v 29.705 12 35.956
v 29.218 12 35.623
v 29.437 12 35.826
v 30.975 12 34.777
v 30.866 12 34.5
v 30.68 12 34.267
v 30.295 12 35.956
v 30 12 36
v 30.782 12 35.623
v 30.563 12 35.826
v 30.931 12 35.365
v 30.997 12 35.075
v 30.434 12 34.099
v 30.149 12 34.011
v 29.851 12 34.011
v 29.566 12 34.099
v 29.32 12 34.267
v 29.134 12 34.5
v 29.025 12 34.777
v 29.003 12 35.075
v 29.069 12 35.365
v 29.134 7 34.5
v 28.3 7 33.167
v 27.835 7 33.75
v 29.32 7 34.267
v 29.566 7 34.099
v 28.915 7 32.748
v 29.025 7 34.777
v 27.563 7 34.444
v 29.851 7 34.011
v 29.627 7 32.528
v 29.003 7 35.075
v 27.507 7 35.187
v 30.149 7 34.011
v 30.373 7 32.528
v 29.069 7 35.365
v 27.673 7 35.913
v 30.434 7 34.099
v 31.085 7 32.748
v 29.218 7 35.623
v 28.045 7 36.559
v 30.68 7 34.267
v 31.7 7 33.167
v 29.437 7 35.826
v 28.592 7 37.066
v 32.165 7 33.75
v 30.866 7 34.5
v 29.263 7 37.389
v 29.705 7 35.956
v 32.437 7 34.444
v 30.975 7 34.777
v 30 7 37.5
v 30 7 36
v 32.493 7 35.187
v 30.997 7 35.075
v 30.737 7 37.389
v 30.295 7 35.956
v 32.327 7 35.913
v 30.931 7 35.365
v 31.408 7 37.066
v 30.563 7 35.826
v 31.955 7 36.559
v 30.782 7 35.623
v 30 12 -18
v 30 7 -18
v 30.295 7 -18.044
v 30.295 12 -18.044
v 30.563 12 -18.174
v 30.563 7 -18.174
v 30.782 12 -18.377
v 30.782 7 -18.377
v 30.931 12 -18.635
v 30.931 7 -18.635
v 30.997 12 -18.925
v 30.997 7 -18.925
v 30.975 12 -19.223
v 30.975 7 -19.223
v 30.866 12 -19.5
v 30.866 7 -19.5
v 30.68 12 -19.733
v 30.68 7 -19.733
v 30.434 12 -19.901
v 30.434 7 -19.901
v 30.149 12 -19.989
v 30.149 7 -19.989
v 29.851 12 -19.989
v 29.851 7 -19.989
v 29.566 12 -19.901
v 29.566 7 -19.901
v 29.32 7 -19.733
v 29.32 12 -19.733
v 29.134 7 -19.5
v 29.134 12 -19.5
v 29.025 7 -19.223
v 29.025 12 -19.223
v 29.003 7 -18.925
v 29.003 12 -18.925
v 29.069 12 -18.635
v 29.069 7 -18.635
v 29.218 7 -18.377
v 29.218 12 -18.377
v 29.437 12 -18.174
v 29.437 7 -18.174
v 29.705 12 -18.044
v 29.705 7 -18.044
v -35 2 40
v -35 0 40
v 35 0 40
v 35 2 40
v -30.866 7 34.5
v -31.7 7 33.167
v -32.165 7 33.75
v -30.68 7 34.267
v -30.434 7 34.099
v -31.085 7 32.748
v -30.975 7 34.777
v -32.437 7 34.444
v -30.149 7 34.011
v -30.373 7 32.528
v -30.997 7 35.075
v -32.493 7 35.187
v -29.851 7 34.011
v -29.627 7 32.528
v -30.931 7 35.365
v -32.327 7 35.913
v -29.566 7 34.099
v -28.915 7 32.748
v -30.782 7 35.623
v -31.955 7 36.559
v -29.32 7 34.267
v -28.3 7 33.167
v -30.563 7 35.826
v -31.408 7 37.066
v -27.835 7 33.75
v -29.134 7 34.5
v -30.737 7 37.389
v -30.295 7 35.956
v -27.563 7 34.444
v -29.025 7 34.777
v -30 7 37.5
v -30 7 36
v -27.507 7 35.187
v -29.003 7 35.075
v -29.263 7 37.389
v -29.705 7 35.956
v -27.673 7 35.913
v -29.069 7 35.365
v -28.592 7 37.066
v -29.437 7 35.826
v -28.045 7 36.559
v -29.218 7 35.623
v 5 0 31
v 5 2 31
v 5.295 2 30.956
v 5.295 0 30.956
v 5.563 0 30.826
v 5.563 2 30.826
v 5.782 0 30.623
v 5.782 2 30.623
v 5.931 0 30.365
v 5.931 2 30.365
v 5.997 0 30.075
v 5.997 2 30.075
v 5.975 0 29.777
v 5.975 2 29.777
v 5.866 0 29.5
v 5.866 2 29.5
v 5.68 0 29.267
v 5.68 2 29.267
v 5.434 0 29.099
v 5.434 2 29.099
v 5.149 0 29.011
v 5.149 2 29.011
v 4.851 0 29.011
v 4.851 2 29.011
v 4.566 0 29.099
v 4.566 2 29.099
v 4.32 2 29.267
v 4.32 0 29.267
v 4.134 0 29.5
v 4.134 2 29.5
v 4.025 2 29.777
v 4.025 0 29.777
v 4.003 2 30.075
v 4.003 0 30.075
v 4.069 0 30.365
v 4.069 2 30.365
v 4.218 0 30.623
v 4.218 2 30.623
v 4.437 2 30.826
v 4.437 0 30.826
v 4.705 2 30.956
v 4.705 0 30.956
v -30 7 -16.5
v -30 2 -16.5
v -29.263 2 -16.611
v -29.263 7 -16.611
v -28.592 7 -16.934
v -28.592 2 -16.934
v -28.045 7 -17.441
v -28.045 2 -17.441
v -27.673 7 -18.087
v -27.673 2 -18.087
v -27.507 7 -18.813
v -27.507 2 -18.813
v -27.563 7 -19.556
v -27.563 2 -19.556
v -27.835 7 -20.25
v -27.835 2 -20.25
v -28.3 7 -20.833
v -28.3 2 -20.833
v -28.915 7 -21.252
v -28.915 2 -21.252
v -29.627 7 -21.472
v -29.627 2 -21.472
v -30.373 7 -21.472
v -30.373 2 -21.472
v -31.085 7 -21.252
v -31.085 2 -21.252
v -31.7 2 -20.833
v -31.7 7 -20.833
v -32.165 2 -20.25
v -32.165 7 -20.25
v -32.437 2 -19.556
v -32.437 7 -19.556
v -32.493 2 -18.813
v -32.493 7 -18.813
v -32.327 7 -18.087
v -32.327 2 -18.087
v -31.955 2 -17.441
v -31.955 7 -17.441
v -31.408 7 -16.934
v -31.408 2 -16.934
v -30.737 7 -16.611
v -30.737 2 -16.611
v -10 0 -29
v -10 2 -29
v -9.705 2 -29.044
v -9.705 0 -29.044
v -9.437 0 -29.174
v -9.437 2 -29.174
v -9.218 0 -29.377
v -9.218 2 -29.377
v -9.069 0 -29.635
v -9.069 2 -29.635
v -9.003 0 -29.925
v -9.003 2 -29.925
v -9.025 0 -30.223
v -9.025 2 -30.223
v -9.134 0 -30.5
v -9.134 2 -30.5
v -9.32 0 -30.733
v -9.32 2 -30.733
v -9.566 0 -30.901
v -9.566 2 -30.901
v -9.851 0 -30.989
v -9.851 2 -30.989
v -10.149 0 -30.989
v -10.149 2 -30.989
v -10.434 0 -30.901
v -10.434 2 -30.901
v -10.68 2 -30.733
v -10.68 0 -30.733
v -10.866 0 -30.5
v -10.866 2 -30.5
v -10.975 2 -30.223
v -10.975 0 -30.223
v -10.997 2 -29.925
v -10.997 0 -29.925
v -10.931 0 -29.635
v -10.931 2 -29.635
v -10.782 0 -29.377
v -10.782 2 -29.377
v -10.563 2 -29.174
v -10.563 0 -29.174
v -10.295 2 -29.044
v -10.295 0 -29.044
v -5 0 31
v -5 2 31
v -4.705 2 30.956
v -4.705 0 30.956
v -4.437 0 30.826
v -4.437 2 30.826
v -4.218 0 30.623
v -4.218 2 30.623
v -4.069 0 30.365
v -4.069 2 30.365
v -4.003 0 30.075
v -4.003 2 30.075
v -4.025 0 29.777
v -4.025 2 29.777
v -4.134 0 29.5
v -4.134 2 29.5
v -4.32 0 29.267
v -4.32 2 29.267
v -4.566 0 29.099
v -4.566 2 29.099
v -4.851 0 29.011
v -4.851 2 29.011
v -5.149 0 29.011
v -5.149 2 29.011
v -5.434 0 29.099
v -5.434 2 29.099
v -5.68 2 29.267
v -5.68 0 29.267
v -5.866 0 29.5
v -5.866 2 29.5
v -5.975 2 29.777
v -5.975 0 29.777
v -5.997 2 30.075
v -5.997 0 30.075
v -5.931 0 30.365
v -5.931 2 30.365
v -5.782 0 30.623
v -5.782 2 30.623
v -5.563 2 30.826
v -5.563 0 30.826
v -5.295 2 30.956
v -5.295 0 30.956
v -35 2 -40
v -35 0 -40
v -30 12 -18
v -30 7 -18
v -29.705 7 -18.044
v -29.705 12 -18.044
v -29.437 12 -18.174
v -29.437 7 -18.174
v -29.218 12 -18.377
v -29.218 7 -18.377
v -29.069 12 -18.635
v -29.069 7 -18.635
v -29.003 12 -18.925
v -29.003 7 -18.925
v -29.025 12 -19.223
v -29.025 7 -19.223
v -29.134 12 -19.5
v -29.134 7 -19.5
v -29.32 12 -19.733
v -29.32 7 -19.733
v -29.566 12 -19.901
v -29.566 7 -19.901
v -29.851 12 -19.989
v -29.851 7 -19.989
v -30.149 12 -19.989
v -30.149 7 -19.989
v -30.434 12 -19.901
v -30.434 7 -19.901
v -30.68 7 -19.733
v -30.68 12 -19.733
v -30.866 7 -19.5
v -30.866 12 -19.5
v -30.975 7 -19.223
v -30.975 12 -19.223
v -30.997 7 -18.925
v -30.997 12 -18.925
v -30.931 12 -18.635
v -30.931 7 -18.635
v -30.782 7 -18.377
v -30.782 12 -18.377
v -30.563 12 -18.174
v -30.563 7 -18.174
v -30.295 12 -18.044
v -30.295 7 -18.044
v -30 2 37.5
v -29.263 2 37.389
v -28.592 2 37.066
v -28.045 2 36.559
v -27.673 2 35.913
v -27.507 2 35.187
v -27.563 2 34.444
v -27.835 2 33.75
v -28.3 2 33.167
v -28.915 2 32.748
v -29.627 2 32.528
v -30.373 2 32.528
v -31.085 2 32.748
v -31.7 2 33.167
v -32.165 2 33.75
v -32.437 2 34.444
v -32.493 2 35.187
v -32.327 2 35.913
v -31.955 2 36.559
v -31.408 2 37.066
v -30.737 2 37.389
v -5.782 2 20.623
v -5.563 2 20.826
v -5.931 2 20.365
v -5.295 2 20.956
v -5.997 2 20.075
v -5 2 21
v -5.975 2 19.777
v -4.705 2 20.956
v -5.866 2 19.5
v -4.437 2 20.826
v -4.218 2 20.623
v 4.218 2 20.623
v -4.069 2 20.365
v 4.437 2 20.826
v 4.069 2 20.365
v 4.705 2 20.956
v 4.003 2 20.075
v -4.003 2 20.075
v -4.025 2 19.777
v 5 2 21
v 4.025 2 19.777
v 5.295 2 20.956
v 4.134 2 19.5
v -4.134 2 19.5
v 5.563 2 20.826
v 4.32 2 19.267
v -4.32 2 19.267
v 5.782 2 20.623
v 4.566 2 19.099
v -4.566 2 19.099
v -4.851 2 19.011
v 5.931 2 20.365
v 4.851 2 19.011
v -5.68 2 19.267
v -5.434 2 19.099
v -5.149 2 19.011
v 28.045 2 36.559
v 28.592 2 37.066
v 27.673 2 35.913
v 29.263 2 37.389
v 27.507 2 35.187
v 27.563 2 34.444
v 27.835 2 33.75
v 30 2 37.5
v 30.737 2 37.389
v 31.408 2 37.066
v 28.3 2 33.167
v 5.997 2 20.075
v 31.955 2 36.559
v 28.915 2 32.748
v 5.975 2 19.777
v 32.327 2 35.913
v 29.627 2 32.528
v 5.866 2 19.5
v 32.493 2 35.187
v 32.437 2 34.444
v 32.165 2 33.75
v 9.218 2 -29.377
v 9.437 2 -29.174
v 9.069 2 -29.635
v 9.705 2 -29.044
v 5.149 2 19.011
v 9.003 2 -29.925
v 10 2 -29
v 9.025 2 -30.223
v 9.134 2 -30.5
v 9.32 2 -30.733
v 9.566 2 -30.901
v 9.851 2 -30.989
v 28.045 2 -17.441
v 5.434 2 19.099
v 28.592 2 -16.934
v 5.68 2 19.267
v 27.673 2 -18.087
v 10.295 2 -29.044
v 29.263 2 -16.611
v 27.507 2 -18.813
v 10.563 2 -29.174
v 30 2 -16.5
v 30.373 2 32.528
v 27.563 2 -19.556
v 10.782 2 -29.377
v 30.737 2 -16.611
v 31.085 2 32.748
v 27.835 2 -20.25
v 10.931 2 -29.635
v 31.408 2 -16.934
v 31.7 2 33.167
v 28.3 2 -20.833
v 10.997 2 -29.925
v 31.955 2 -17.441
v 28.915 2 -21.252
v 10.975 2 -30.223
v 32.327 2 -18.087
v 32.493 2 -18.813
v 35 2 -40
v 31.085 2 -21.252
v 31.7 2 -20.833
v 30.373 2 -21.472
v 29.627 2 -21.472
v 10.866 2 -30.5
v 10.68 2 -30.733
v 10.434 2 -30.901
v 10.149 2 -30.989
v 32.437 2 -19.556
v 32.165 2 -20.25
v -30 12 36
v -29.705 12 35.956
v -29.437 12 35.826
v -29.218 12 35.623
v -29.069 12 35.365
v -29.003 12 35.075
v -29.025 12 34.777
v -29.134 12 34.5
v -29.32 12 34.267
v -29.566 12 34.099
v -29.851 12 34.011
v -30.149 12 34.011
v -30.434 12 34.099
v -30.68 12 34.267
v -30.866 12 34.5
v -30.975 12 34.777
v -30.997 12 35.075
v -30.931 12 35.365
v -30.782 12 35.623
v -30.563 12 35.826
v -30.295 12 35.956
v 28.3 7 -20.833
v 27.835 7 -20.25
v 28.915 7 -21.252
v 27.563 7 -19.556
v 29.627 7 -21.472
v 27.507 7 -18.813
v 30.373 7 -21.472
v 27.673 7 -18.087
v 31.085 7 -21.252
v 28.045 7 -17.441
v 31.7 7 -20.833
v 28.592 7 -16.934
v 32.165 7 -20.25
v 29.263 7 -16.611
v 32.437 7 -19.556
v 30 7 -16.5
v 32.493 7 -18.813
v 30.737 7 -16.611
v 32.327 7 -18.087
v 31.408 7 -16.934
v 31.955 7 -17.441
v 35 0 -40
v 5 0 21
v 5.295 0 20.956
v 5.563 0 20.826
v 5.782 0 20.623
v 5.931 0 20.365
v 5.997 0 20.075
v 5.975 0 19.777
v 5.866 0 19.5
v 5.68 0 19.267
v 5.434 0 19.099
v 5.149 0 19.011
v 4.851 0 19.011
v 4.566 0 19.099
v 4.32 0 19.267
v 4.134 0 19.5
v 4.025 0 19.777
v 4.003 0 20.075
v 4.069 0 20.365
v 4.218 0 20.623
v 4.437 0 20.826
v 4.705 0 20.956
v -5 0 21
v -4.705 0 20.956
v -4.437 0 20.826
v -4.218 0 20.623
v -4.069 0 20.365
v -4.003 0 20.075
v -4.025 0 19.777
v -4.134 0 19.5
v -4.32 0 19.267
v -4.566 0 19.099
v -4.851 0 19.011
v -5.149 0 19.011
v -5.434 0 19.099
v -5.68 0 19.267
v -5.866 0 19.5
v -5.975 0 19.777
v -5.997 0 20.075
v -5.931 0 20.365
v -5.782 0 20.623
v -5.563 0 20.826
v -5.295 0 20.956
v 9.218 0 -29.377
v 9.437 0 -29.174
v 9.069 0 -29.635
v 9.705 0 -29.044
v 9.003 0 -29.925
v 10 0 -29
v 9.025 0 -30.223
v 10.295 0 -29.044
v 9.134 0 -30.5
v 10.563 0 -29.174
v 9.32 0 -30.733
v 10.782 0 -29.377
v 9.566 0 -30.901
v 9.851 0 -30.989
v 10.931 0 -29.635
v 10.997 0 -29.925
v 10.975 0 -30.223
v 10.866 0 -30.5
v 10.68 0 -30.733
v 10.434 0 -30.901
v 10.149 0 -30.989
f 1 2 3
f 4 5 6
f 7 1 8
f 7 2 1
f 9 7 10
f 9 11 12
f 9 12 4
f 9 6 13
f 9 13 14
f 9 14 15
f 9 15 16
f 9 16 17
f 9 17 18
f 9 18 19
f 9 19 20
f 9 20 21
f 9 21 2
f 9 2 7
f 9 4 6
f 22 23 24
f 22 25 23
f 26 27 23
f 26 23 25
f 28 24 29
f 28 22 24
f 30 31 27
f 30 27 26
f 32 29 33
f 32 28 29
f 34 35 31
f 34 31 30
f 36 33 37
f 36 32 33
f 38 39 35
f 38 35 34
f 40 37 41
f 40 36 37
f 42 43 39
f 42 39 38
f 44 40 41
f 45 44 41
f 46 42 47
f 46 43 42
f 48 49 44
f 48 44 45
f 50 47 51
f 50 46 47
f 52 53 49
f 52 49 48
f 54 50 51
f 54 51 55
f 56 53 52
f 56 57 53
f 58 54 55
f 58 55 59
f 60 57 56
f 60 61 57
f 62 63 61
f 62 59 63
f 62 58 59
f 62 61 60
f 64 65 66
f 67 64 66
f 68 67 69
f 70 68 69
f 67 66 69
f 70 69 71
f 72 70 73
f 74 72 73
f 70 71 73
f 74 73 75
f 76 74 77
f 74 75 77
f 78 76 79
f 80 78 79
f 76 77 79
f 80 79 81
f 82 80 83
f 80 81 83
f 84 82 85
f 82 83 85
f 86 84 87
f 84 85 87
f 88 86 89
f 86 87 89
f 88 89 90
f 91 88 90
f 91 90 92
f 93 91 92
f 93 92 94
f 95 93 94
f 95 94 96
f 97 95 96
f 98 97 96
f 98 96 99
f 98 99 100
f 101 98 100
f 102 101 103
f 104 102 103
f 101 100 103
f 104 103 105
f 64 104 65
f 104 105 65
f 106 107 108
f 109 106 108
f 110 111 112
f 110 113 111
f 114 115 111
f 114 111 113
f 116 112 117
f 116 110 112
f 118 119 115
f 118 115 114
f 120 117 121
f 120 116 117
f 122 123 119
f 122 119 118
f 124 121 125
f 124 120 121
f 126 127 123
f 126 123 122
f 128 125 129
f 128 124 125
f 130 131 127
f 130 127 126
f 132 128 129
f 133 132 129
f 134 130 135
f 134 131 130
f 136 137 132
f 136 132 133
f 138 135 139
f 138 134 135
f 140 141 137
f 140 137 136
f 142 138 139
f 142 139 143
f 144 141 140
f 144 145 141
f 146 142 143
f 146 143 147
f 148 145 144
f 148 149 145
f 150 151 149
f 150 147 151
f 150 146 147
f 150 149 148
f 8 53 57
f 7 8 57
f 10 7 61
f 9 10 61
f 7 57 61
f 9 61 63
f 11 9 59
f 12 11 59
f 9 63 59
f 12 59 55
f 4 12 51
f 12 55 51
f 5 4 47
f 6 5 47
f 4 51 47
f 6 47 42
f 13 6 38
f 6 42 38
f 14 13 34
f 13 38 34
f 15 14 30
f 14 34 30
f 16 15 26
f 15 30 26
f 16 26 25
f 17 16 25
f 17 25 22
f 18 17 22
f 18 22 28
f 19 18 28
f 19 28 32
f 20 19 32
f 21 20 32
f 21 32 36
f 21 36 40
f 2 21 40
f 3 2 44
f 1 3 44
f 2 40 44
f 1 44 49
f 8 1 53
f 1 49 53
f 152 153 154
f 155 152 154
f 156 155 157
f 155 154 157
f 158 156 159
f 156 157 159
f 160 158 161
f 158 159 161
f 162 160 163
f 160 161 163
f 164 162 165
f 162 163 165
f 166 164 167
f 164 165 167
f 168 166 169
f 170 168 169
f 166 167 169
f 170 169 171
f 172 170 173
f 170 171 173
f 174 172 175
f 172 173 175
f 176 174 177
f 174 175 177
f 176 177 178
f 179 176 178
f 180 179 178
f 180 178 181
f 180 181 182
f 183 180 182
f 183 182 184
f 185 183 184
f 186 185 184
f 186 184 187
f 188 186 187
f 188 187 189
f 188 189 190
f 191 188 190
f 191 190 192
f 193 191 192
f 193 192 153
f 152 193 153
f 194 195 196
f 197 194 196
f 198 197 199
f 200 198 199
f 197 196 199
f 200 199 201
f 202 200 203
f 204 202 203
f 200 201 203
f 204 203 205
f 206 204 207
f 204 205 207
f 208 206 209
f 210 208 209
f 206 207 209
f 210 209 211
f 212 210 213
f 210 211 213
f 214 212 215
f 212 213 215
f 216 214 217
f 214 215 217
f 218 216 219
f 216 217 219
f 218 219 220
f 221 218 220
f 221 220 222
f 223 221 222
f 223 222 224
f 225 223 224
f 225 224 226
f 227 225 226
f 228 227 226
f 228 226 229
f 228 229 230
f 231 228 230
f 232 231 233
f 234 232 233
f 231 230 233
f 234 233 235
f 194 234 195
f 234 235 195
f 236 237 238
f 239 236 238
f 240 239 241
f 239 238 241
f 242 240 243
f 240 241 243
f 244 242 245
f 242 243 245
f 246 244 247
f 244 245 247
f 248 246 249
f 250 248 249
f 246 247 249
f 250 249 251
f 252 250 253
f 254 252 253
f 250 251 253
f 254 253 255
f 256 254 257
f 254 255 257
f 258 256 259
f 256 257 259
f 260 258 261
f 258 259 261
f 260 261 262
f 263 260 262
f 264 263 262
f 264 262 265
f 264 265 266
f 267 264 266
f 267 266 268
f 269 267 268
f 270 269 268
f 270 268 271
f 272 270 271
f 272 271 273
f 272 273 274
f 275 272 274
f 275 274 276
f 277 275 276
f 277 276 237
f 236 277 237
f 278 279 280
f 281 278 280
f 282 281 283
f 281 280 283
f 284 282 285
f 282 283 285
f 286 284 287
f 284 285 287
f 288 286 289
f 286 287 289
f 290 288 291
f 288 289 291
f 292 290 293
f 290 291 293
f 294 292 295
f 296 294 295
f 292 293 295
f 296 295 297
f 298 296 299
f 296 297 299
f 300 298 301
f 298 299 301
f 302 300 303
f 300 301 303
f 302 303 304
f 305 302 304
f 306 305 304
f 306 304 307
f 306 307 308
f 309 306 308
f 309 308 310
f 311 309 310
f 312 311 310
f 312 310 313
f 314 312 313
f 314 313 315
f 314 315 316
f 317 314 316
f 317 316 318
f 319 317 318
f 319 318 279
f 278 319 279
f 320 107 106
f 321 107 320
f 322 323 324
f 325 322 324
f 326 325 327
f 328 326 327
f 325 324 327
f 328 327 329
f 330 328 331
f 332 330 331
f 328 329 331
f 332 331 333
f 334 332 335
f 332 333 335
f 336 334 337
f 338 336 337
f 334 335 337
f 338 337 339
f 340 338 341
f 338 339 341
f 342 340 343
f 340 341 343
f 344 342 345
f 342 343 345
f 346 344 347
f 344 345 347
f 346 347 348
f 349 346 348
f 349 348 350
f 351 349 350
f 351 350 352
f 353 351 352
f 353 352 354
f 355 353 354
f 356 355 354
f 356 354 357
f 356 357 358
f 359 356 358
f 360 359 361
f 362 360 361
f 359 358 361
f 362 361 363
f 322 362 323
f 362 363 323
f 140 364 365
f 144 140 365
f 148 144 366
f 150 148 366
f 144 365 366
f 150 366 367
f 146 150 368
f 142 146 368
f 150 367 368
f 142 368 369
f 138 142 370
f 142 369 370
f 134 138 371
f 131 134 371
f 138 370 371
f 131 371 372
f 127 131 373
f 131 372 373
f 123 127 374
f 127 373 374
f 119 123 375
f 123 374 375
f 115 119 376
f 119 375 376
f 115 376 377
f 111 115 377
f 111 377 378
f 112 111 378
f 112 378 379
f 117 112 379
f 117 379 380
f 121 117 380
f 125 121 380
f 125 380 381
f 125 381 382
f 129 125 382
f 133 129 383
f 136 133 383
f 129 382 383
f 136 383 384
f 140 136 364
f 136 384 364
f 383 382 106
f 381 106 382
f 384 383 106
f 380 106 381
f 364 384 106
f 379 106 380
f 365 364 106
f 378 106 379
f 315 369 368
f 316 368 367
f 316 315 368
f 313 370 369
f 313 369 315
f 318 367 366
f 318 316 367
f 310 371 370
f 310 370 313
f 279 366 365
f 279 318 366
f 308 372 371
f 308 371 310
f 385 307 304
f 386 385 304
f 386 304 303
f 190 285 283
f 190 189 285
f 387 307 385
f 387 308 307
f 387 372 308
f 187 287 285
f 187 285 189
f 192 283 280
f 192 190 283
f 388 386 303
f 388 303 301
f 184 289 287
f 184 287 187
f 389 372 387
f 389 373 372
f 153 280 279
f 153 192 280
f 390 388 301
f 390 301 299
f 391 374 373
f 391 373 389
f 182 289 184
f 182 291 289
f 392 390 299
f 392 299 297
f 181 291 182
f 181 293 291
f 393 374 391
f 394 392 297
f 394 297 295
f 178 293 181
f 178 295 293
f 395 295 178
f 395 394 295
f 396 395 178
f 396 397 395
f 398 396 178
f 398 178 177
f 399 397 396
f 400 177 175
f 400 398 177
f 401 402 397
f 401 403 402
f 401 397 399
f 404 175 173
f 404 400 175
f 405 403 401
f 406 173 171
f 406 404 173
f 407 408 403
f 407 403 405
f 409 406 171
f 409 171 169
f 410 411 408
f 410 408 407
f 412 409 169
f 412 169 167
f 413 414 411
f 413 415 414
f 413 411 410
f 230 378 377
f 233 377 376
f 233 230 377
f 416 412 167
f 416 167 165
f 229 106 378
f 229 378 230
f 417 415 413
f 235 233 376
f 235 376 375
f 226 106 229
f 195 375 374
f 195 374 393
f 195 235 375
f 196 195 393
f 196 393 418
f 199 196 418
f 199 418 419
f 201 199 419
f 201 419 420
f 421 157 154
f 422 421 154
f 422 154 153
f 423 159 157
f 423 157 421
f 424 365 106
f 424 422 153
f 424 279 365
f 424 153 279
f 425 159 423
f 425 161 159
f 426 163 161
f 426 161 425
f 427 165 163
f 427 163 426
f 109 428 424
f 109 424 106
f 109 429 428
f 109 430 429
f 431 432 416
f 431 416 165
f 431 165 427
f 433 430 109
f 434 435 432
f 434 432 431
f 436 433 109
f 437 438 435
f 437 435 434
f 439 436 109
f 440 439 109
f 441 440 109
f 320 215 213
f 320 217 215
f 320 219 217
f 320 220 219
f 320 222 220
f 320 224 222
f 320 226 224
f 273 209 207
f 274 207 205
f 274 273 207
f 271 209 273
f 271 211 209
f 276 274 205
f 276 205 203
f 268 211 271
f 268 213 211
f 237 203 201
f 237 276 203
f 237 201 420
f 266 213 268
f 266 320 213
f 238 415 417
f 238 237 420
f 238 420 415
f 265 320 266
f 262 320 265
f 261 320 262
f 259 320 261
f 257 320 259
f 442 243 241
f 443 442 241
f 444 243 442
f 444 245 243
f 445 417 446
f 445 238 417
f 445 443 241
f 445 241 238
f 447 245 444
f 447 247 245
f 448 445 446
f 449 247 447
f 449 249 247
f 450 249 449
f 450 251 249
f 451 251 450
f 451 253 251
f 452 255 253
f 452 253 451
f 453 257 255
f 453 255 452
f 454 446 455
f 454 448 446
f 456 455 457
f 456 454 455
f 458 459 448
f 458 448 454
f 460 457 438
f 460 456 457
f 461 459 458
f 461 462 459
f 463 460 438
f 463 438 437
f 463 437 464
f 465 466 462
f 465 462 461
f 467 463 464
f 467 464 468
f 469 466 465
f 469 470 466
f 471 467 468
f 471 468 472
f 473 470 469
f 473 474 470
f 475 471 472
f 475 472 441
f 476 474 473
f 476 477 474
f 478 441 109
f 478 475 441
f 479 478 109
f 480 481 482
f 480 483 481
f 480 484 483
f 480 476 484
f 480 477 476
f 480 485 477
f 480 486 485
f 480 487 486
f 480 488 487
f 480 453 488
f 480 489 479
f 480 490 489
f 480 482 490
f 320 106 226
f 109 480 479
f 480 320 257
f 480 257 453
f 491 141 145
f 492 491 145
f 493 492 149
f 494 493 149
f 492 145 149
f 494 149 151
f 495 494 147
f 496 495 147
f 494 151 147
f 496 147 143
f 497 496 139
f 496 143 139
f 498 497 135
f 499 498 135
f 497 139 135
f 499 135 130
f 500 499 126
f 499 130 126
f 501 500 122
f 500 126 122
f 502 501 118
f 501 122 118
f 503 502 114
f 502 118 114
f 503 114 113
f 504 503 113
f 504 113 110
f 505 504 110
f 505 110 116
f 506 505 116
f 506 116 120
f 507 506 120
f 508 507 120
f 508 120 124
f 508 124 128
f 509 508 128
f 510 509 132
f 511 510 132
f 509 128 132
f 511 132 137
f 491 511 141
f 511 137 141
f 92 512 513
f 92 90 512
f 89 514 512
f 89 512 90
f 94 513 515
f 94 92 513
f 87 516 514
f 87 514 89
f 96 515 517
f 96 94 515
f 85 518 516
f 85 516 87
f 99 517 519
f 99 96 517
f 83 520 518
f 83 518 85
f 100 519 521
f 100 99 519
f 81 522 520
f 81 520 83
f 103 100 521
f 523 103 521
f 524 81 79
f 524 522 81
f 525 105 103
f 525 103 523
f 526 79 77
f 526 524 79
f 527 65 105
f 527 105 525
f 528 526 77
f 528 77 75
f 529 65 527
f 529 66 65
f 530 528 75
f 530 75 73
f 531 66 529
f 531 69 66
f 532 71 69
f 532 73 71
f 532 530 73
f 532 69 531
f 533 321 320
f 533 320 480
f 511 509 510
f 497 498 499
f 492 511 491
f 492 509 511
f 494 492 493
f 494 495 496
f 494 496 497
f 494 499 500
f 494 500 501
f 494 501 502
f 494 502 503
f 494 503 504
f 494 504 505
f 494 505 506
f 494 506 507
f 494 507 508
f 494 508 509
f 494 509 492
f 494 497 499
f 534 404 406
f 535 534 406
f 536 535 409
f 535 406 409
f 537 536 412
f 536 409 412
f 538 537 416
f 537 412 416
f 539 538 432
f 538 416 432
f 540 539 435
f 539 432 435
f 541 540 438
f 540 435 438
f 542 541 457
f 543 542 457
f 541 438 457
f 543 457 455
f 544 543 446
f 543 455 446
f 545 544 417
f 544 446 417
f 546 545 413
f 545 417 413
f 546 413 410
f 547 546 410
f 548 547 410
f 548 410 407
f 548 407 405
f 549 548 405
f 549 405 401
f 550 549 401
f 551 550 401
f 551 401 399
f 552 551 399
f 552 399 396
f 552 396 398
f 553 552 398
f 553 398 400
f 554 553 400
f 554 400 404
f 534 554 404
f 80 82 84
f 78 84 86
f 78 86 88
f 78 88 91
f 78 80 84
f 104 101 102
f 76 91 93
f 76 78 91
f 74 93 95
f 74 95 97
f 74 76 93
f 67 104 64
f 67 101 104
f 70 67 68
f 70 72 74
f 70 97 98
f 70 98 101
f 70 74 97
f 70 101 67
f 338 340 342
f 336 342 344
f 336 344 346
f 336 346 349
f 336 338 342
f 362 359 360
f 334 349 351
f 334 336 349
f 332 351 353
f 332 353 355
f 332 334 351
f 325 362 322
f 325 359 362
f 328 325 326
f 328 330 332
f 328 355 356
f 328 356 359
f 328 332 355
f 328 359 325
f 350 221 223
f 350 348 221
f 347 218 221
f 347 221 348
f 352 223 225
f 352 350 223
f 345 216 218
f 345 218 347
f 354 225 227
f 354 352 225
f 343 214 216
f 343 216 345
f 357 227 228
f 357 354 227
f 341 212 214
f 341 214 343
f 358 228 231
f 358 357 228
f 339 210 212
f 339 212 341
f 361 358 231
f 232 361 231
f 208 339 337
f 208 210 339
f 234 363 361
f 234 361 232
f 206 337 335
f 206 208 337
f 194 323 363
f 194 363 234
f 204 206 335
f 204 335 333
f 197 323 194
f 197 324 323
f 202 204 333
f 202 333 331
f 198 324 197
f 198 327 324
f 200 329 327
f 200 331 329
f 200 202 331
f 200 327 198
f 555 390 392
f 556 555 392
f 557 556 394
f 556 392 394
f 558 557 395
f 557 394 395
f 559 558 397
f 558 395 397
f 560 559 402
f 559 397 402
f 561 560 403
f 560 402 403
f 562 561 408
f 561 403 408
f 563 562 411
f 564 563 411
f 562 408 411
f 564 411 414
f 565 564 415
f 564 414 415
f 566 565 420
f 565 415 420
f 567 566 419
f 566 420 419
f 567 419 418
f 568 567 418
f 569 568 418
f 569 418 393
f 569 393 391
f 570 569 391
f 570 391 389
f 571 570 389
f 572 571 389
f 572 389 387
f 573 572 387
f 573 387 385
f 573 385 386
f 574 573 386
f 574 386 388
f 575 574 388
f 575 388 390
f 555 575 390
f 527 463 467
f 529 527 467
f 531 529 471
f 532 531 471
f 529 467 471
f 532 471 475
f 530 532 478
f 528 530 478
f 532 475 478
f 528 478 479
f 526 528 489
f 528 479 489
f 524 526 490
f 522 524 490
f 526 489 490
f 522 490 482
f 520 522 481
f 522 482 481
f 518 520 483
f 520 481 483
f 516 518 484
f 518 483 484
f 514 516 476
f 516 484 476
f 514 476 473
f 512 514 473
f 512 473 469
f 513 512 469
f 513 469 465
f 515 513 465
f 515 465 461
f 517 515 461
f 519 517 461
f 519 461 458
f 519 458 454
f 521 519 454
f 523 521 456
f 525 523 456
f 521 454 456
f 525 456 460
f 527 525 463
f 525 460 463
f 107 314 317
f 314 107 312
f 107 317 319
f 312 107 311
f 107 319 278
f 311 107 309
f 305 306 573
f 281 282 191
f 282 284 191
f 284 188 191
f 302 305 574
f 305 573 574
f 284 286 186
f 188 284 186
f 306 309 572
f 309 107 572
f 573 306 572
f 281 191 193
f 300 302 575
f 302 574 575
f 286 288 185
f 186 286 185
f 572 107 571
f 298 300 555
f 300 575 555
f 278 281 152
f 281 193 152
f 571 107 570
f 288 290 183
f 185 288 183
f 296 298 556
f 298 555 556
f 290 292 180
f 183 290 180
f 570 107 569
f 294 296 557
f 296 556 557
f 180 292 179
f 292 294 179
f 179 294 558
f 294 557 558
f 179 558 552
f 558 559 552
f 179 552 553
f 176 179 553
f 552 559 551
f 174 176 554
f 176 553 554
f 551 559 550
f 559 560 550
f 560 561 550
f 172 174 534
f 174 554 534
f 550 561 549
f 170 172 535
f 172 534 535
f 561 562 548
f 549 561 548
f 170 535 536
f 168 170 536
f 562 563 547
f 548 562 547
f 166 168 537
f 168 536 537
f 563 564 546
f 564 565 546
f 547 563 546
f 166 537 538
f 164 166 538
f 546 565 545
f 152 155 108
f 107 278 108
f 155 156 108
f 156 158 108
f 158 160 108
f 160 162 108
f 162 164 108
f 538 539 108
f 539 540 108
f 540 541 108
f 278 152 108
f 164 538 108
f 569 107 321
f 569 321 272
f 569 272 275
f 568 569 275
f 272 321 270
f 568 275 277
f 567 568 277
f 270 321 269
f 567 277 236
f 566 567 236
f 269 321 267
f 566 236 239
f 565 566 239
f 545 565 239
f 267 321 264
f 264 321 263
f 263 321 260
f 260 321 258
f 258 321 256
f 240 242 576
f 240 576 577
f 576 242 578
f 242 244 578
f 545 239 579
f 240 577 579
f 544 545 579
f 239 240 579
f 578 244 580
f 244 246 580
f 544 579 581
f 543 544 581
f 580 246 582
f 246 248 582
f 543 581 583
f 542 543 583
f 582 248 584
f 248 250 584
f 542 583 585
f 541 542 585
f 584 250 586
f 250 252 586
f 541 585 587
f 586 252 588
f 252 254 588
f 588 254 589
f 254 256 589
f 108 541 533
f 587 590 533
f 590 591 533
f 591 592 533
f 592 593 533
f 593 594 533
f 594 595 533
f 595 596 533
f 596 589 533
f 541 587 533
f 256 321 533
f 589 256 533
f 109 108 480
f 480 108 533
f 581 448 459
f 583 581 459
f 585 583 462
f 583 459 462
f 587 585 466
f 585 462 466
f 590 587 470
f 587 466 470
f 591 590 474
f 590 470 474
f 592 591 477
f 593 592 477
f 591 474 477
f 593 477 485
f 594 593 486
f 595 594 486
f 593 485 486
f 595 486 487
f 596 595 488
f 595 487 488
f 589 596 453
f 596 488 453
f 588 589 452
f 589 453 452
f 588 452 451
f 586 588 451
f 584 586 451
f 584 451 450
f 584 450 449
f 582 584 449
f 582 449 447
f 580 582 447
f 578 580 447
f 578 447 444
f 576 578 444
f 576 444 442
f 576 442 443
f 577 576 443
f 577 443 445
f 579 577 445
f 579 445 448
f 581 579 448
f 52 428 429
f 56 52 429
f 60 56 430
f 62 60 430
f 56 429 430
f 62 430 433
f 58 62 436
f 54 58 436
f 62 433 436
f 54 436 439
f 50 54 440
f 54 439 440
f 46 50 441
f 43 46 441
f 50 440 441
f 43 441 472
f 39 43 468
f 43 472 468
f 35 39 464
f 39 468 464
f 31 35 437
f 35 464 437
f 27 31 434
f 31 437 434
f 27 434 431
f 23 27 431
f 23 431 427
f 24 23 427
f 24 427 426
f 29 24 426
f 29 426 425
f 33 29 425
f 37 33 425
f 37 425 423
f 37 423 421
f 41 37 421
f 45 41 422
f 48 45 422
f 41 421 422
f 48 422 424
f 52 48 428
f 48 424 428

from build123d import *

# Parameters (mm, degrees)
BOSS_EXTRUDE1_OUTLINE_W = 70
BOSS_EXTRUDE1_OUTLINE_H = 80
BOSS_EXTRUDE1_DEPTH     = 2
SKETCH2_R               = 2.5
BOSS_EXTRUDE2_DEPTH     = 5
SKETCH3_R               = 1
BOSS_EXTRUDE3_DEPTH     = 5
SKETCH4_R               = 1
CUT_EXTRUDE1_DEPTH      = 55.083269132
SKETCH5_R               = 1
CUT_EXTRUDE2_DEPTH      = 55.083269132


# Read off the part's stored shape, not the designer's step: Boss-Extrude1
with BuildPart() as part:
    # Boss-Extrude1 outline → Boss-Extrude1 (new body)
    with BuildSketch(Plane(origin=(0, 0, 0), x_dir=(1, 0, 0), z_dir=(0, 1, 0))):
        Rectangle(BOSS_EXTRUDE1_OUTLINE_W, BOSS_EXTRUDE1_OUTLINE_H)
    extrude(amount=BOSS_EXTRUDE1_DEPTH)

    # Sketch2 → Boss-Extrude2 (add)
    with BuildSketch(Plane(origin=(0, 2, 0), x_dir=(1, 0, 0), z_dir=(0, 1, 0))):
        with Locations(Location((-30, 19, 0), (0, 0, 270))):
            Circle(SKETCH2_R)
        with Locations(Location((30, 19, 0), (0, 0, 270))):
            Circle(SKETCH2_R)
        with Locations(Location((-30, -35, 0), (0, 0, 270))):
            Circle(SKETCH2_R)
        with Locations(Location((30, -35, 0), (0, 0, 270))):
            Circle(SKETCH2_R)
    extrude(amount=BOSS_EXTRUDE2_DEPTH)

    # Sketch3 → Boss-Extrude3 (add)
    with BuildSketch(Plane(origin=(0, 7, 0), x_dir=(1, 0, 0), z_dir=(0, 1, 0))):
        with Locations(Location((-30, 19, 0), (0, 0, 270))):
            Circle(SKETCH3_R)
        with Locations(Location((30, 19, 0), (0, 0, 270))):
            Circle(SKETCH3_R)
        with Locations(Location((30, -35, 0), (0, 0, 270))):
            Circle(SKETCH3_R)
        with Locations(Location((-30, -35, 0), (0, 0, 270))):
            Circle(SKETCH3_R)
    extrude(amount=BOSS_EXTRUDE3_DEPTH)

    # Sketch4 → Cut-Extrude1 (cut, through all)
    with BuildSketch(Plane(origin=(0, 2, 0), x_dir=(1, 0, 0), z_dir=(0, 1, 0))):
        with Locations(Location((-5, -30, 0), (0, 0, 270))):
            Circle(SKETCH4_R)
        with Locations(Location((-5, -20, 0), (0, 0, 270))):
            Circle(SKETCH4_R)
        with Locations(Location((5, -20, 0), (0, 0, 270))):
            Circle(SKETCH4_R)
        with Locations(Location((5, -30, 0), (0, 0, 270))):
            Circle(SKETCH4_R)
    extrude(amount=-CUT_EXTRUDE1_DEPTH, mode=Mode.SUBTRACT)

    # Sketch5 → Cut-Extrude2 (cut, through all)
    with BuildSketch(Plane(origin=(0, 2, 0), x_dir=(1, 0, 0), z_dir=(0, 1, 0))):
        with Locations(Location((-10, 30, 0), (0, 0, 270))):
            Circle(SKETCH5_R)
        with Locations(Location((10, 30, 0), (0, 0, 270))):
            Circle(SKETCH5_R)
    extrude(amount=-CUT_EXTRUDE2_DEPTH, mode=Mode.SUBTRACT)


solid = part.part
